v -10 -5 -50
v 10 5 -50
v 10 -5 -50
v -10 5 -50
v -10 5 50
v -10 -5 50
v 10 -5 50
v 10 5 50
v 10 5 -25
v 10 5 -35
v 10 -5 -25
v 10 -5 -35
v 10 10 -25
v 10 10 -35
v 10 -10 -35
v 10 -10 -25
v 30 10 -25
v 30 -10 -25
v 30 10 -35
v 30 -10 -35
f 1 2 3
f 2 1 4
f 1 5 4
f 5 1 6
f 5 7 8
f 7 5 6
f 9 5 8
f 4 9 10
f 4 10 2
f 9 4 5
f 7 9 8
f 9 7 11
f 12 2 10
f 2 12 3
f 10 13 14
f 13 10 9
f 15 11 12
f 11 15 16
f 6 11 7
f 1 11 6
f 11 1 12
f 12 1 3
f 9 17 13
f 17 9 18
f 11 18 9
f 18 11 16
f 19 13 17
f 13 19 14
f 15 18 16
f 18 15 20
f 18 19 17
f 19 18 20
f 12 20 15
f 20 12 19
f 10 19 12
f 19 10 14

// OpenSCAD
polyline = [[0,0,0],[2,2,2],[6,4,8],[10,12,14]];


/*

(foo.length); //2
(foo[0].length); //3

    TotalWidth = dxf_dim(file="drawing.dxf", name="TotalWidth",
                        layer="SCAD.Origin", origin=[0, 0], scale=1);
        echo(str(polyline[n][x])); //prints x point

        translate([5,0,0])
    */

// from onwards in module

x = 0;
y = 1;
z = 2;

prevx = 0;
prevy = 0;
prevz = 0;

prevlnelem = 0;

prevprevx = 0;
prevprevy = 0;
prevprevz = 0;

lnelem = 0;

lenxcomp = 0;
lenycomp = 0;
lenzcomp = 0;

section = 10;
extra_space = 0.25*section;
 // margin will be defined later based on angle
margin = 0;


numpoints = len(polyline);

for (n =[0:numpoints-1]) {
    lenxcomp = 0; // point minus previous point absolute (difference)
    lenycomp = 0;
    lenzcomp = 0;
    // if not first point
    if(n != 0) {
        //calc length of vector
        lnelem = abs(sqrt(
        pow(abs((polyline[n][x]-prevx)),2)+
        pow(abs((polyline[n][y]-prevy)),2)+
        pow(abs((polyline[n][z]-prevz)),2)));
        // calc direction angles from cosines
        anglxcomp  = acos(lenxcomp/abs(lnelem));
        anglycomp  = acos(lenycomp/abs(lnelem));
        anglzcomp  = acos(lenzcomp/abs(lnelem));

        // extrude only if there is no more than 2 points
        if(numpoints < 2) {
            // from polyline at n linear extrude until [1]
        }

        if(n>=2) {
            // calc angle
            alpha = acos((polyline[n][x] * prevx +
            polyline[n][y] * prevy +
            polyline[n][z] * prevz)
            / ( (abs(sqrt(
            pow(abs(polyline[n][x]),2)+
            pow(abs(polyline[n][y]),2)+
            pow(abs(polyline[n][z]),2)))*
                abs(sqrt(
            pow(abs(prevx),2)+
            pow(abs(prevy),2)+
            pow(abs(prevz),2))))));
            // here comes def of margin
            margin = tan(0.5*(180-alpha))*(0.5*section+extra_space);
            // here: first move to point (translate to point)

            // then: calculate and rotate for direction (from origin to point)

            // here: linear extude until:
            // if n = 2 linear extrude until first fillet n=1 (prevprev - prev - margin)

            if(n==2) {
                translate([prevprevx,prevprevy,prevprevz])
                linear_extrude(height = (prevlnelem-margin), center = true)square([20, 10], center = true);
            }
            if(n>=2 && n < numpoints-1) {
                translate([prevprevx,prevprevy,prevprevz])
                //linear extrude from point + margin in direction until point - margin
                linear_extrude(height = (prevlnelem-margin), center = true)square([20, 10], center = true);
            }
            if(n == numpoints-1) {
                //linear extrude until point
            }


            // if n =>2 linear extrude from prevprev + margin until prev - margin


            // here: rotate extrude
            rot_angle = 180 - alpha;

        }


    }
    // for next iteration store current point
    prevlnelem = lnelem;
    prevprevx = prevx;
    prevprevy = prevy;
    prevprevz = prevz;
    prevx = polyline[n][x];
    prevy = polyline[n][y];
    prevz = polyline[n][z];


}

module shape() {
    square(size = [2, 2], center = true);
}



module sweep_polyline(shape, polyline) {

}
rotate([90,0,0])
translate([20, -30, 0])
        linear_extrude(height = 20, center = true)
            square([20, 10], center = true);
